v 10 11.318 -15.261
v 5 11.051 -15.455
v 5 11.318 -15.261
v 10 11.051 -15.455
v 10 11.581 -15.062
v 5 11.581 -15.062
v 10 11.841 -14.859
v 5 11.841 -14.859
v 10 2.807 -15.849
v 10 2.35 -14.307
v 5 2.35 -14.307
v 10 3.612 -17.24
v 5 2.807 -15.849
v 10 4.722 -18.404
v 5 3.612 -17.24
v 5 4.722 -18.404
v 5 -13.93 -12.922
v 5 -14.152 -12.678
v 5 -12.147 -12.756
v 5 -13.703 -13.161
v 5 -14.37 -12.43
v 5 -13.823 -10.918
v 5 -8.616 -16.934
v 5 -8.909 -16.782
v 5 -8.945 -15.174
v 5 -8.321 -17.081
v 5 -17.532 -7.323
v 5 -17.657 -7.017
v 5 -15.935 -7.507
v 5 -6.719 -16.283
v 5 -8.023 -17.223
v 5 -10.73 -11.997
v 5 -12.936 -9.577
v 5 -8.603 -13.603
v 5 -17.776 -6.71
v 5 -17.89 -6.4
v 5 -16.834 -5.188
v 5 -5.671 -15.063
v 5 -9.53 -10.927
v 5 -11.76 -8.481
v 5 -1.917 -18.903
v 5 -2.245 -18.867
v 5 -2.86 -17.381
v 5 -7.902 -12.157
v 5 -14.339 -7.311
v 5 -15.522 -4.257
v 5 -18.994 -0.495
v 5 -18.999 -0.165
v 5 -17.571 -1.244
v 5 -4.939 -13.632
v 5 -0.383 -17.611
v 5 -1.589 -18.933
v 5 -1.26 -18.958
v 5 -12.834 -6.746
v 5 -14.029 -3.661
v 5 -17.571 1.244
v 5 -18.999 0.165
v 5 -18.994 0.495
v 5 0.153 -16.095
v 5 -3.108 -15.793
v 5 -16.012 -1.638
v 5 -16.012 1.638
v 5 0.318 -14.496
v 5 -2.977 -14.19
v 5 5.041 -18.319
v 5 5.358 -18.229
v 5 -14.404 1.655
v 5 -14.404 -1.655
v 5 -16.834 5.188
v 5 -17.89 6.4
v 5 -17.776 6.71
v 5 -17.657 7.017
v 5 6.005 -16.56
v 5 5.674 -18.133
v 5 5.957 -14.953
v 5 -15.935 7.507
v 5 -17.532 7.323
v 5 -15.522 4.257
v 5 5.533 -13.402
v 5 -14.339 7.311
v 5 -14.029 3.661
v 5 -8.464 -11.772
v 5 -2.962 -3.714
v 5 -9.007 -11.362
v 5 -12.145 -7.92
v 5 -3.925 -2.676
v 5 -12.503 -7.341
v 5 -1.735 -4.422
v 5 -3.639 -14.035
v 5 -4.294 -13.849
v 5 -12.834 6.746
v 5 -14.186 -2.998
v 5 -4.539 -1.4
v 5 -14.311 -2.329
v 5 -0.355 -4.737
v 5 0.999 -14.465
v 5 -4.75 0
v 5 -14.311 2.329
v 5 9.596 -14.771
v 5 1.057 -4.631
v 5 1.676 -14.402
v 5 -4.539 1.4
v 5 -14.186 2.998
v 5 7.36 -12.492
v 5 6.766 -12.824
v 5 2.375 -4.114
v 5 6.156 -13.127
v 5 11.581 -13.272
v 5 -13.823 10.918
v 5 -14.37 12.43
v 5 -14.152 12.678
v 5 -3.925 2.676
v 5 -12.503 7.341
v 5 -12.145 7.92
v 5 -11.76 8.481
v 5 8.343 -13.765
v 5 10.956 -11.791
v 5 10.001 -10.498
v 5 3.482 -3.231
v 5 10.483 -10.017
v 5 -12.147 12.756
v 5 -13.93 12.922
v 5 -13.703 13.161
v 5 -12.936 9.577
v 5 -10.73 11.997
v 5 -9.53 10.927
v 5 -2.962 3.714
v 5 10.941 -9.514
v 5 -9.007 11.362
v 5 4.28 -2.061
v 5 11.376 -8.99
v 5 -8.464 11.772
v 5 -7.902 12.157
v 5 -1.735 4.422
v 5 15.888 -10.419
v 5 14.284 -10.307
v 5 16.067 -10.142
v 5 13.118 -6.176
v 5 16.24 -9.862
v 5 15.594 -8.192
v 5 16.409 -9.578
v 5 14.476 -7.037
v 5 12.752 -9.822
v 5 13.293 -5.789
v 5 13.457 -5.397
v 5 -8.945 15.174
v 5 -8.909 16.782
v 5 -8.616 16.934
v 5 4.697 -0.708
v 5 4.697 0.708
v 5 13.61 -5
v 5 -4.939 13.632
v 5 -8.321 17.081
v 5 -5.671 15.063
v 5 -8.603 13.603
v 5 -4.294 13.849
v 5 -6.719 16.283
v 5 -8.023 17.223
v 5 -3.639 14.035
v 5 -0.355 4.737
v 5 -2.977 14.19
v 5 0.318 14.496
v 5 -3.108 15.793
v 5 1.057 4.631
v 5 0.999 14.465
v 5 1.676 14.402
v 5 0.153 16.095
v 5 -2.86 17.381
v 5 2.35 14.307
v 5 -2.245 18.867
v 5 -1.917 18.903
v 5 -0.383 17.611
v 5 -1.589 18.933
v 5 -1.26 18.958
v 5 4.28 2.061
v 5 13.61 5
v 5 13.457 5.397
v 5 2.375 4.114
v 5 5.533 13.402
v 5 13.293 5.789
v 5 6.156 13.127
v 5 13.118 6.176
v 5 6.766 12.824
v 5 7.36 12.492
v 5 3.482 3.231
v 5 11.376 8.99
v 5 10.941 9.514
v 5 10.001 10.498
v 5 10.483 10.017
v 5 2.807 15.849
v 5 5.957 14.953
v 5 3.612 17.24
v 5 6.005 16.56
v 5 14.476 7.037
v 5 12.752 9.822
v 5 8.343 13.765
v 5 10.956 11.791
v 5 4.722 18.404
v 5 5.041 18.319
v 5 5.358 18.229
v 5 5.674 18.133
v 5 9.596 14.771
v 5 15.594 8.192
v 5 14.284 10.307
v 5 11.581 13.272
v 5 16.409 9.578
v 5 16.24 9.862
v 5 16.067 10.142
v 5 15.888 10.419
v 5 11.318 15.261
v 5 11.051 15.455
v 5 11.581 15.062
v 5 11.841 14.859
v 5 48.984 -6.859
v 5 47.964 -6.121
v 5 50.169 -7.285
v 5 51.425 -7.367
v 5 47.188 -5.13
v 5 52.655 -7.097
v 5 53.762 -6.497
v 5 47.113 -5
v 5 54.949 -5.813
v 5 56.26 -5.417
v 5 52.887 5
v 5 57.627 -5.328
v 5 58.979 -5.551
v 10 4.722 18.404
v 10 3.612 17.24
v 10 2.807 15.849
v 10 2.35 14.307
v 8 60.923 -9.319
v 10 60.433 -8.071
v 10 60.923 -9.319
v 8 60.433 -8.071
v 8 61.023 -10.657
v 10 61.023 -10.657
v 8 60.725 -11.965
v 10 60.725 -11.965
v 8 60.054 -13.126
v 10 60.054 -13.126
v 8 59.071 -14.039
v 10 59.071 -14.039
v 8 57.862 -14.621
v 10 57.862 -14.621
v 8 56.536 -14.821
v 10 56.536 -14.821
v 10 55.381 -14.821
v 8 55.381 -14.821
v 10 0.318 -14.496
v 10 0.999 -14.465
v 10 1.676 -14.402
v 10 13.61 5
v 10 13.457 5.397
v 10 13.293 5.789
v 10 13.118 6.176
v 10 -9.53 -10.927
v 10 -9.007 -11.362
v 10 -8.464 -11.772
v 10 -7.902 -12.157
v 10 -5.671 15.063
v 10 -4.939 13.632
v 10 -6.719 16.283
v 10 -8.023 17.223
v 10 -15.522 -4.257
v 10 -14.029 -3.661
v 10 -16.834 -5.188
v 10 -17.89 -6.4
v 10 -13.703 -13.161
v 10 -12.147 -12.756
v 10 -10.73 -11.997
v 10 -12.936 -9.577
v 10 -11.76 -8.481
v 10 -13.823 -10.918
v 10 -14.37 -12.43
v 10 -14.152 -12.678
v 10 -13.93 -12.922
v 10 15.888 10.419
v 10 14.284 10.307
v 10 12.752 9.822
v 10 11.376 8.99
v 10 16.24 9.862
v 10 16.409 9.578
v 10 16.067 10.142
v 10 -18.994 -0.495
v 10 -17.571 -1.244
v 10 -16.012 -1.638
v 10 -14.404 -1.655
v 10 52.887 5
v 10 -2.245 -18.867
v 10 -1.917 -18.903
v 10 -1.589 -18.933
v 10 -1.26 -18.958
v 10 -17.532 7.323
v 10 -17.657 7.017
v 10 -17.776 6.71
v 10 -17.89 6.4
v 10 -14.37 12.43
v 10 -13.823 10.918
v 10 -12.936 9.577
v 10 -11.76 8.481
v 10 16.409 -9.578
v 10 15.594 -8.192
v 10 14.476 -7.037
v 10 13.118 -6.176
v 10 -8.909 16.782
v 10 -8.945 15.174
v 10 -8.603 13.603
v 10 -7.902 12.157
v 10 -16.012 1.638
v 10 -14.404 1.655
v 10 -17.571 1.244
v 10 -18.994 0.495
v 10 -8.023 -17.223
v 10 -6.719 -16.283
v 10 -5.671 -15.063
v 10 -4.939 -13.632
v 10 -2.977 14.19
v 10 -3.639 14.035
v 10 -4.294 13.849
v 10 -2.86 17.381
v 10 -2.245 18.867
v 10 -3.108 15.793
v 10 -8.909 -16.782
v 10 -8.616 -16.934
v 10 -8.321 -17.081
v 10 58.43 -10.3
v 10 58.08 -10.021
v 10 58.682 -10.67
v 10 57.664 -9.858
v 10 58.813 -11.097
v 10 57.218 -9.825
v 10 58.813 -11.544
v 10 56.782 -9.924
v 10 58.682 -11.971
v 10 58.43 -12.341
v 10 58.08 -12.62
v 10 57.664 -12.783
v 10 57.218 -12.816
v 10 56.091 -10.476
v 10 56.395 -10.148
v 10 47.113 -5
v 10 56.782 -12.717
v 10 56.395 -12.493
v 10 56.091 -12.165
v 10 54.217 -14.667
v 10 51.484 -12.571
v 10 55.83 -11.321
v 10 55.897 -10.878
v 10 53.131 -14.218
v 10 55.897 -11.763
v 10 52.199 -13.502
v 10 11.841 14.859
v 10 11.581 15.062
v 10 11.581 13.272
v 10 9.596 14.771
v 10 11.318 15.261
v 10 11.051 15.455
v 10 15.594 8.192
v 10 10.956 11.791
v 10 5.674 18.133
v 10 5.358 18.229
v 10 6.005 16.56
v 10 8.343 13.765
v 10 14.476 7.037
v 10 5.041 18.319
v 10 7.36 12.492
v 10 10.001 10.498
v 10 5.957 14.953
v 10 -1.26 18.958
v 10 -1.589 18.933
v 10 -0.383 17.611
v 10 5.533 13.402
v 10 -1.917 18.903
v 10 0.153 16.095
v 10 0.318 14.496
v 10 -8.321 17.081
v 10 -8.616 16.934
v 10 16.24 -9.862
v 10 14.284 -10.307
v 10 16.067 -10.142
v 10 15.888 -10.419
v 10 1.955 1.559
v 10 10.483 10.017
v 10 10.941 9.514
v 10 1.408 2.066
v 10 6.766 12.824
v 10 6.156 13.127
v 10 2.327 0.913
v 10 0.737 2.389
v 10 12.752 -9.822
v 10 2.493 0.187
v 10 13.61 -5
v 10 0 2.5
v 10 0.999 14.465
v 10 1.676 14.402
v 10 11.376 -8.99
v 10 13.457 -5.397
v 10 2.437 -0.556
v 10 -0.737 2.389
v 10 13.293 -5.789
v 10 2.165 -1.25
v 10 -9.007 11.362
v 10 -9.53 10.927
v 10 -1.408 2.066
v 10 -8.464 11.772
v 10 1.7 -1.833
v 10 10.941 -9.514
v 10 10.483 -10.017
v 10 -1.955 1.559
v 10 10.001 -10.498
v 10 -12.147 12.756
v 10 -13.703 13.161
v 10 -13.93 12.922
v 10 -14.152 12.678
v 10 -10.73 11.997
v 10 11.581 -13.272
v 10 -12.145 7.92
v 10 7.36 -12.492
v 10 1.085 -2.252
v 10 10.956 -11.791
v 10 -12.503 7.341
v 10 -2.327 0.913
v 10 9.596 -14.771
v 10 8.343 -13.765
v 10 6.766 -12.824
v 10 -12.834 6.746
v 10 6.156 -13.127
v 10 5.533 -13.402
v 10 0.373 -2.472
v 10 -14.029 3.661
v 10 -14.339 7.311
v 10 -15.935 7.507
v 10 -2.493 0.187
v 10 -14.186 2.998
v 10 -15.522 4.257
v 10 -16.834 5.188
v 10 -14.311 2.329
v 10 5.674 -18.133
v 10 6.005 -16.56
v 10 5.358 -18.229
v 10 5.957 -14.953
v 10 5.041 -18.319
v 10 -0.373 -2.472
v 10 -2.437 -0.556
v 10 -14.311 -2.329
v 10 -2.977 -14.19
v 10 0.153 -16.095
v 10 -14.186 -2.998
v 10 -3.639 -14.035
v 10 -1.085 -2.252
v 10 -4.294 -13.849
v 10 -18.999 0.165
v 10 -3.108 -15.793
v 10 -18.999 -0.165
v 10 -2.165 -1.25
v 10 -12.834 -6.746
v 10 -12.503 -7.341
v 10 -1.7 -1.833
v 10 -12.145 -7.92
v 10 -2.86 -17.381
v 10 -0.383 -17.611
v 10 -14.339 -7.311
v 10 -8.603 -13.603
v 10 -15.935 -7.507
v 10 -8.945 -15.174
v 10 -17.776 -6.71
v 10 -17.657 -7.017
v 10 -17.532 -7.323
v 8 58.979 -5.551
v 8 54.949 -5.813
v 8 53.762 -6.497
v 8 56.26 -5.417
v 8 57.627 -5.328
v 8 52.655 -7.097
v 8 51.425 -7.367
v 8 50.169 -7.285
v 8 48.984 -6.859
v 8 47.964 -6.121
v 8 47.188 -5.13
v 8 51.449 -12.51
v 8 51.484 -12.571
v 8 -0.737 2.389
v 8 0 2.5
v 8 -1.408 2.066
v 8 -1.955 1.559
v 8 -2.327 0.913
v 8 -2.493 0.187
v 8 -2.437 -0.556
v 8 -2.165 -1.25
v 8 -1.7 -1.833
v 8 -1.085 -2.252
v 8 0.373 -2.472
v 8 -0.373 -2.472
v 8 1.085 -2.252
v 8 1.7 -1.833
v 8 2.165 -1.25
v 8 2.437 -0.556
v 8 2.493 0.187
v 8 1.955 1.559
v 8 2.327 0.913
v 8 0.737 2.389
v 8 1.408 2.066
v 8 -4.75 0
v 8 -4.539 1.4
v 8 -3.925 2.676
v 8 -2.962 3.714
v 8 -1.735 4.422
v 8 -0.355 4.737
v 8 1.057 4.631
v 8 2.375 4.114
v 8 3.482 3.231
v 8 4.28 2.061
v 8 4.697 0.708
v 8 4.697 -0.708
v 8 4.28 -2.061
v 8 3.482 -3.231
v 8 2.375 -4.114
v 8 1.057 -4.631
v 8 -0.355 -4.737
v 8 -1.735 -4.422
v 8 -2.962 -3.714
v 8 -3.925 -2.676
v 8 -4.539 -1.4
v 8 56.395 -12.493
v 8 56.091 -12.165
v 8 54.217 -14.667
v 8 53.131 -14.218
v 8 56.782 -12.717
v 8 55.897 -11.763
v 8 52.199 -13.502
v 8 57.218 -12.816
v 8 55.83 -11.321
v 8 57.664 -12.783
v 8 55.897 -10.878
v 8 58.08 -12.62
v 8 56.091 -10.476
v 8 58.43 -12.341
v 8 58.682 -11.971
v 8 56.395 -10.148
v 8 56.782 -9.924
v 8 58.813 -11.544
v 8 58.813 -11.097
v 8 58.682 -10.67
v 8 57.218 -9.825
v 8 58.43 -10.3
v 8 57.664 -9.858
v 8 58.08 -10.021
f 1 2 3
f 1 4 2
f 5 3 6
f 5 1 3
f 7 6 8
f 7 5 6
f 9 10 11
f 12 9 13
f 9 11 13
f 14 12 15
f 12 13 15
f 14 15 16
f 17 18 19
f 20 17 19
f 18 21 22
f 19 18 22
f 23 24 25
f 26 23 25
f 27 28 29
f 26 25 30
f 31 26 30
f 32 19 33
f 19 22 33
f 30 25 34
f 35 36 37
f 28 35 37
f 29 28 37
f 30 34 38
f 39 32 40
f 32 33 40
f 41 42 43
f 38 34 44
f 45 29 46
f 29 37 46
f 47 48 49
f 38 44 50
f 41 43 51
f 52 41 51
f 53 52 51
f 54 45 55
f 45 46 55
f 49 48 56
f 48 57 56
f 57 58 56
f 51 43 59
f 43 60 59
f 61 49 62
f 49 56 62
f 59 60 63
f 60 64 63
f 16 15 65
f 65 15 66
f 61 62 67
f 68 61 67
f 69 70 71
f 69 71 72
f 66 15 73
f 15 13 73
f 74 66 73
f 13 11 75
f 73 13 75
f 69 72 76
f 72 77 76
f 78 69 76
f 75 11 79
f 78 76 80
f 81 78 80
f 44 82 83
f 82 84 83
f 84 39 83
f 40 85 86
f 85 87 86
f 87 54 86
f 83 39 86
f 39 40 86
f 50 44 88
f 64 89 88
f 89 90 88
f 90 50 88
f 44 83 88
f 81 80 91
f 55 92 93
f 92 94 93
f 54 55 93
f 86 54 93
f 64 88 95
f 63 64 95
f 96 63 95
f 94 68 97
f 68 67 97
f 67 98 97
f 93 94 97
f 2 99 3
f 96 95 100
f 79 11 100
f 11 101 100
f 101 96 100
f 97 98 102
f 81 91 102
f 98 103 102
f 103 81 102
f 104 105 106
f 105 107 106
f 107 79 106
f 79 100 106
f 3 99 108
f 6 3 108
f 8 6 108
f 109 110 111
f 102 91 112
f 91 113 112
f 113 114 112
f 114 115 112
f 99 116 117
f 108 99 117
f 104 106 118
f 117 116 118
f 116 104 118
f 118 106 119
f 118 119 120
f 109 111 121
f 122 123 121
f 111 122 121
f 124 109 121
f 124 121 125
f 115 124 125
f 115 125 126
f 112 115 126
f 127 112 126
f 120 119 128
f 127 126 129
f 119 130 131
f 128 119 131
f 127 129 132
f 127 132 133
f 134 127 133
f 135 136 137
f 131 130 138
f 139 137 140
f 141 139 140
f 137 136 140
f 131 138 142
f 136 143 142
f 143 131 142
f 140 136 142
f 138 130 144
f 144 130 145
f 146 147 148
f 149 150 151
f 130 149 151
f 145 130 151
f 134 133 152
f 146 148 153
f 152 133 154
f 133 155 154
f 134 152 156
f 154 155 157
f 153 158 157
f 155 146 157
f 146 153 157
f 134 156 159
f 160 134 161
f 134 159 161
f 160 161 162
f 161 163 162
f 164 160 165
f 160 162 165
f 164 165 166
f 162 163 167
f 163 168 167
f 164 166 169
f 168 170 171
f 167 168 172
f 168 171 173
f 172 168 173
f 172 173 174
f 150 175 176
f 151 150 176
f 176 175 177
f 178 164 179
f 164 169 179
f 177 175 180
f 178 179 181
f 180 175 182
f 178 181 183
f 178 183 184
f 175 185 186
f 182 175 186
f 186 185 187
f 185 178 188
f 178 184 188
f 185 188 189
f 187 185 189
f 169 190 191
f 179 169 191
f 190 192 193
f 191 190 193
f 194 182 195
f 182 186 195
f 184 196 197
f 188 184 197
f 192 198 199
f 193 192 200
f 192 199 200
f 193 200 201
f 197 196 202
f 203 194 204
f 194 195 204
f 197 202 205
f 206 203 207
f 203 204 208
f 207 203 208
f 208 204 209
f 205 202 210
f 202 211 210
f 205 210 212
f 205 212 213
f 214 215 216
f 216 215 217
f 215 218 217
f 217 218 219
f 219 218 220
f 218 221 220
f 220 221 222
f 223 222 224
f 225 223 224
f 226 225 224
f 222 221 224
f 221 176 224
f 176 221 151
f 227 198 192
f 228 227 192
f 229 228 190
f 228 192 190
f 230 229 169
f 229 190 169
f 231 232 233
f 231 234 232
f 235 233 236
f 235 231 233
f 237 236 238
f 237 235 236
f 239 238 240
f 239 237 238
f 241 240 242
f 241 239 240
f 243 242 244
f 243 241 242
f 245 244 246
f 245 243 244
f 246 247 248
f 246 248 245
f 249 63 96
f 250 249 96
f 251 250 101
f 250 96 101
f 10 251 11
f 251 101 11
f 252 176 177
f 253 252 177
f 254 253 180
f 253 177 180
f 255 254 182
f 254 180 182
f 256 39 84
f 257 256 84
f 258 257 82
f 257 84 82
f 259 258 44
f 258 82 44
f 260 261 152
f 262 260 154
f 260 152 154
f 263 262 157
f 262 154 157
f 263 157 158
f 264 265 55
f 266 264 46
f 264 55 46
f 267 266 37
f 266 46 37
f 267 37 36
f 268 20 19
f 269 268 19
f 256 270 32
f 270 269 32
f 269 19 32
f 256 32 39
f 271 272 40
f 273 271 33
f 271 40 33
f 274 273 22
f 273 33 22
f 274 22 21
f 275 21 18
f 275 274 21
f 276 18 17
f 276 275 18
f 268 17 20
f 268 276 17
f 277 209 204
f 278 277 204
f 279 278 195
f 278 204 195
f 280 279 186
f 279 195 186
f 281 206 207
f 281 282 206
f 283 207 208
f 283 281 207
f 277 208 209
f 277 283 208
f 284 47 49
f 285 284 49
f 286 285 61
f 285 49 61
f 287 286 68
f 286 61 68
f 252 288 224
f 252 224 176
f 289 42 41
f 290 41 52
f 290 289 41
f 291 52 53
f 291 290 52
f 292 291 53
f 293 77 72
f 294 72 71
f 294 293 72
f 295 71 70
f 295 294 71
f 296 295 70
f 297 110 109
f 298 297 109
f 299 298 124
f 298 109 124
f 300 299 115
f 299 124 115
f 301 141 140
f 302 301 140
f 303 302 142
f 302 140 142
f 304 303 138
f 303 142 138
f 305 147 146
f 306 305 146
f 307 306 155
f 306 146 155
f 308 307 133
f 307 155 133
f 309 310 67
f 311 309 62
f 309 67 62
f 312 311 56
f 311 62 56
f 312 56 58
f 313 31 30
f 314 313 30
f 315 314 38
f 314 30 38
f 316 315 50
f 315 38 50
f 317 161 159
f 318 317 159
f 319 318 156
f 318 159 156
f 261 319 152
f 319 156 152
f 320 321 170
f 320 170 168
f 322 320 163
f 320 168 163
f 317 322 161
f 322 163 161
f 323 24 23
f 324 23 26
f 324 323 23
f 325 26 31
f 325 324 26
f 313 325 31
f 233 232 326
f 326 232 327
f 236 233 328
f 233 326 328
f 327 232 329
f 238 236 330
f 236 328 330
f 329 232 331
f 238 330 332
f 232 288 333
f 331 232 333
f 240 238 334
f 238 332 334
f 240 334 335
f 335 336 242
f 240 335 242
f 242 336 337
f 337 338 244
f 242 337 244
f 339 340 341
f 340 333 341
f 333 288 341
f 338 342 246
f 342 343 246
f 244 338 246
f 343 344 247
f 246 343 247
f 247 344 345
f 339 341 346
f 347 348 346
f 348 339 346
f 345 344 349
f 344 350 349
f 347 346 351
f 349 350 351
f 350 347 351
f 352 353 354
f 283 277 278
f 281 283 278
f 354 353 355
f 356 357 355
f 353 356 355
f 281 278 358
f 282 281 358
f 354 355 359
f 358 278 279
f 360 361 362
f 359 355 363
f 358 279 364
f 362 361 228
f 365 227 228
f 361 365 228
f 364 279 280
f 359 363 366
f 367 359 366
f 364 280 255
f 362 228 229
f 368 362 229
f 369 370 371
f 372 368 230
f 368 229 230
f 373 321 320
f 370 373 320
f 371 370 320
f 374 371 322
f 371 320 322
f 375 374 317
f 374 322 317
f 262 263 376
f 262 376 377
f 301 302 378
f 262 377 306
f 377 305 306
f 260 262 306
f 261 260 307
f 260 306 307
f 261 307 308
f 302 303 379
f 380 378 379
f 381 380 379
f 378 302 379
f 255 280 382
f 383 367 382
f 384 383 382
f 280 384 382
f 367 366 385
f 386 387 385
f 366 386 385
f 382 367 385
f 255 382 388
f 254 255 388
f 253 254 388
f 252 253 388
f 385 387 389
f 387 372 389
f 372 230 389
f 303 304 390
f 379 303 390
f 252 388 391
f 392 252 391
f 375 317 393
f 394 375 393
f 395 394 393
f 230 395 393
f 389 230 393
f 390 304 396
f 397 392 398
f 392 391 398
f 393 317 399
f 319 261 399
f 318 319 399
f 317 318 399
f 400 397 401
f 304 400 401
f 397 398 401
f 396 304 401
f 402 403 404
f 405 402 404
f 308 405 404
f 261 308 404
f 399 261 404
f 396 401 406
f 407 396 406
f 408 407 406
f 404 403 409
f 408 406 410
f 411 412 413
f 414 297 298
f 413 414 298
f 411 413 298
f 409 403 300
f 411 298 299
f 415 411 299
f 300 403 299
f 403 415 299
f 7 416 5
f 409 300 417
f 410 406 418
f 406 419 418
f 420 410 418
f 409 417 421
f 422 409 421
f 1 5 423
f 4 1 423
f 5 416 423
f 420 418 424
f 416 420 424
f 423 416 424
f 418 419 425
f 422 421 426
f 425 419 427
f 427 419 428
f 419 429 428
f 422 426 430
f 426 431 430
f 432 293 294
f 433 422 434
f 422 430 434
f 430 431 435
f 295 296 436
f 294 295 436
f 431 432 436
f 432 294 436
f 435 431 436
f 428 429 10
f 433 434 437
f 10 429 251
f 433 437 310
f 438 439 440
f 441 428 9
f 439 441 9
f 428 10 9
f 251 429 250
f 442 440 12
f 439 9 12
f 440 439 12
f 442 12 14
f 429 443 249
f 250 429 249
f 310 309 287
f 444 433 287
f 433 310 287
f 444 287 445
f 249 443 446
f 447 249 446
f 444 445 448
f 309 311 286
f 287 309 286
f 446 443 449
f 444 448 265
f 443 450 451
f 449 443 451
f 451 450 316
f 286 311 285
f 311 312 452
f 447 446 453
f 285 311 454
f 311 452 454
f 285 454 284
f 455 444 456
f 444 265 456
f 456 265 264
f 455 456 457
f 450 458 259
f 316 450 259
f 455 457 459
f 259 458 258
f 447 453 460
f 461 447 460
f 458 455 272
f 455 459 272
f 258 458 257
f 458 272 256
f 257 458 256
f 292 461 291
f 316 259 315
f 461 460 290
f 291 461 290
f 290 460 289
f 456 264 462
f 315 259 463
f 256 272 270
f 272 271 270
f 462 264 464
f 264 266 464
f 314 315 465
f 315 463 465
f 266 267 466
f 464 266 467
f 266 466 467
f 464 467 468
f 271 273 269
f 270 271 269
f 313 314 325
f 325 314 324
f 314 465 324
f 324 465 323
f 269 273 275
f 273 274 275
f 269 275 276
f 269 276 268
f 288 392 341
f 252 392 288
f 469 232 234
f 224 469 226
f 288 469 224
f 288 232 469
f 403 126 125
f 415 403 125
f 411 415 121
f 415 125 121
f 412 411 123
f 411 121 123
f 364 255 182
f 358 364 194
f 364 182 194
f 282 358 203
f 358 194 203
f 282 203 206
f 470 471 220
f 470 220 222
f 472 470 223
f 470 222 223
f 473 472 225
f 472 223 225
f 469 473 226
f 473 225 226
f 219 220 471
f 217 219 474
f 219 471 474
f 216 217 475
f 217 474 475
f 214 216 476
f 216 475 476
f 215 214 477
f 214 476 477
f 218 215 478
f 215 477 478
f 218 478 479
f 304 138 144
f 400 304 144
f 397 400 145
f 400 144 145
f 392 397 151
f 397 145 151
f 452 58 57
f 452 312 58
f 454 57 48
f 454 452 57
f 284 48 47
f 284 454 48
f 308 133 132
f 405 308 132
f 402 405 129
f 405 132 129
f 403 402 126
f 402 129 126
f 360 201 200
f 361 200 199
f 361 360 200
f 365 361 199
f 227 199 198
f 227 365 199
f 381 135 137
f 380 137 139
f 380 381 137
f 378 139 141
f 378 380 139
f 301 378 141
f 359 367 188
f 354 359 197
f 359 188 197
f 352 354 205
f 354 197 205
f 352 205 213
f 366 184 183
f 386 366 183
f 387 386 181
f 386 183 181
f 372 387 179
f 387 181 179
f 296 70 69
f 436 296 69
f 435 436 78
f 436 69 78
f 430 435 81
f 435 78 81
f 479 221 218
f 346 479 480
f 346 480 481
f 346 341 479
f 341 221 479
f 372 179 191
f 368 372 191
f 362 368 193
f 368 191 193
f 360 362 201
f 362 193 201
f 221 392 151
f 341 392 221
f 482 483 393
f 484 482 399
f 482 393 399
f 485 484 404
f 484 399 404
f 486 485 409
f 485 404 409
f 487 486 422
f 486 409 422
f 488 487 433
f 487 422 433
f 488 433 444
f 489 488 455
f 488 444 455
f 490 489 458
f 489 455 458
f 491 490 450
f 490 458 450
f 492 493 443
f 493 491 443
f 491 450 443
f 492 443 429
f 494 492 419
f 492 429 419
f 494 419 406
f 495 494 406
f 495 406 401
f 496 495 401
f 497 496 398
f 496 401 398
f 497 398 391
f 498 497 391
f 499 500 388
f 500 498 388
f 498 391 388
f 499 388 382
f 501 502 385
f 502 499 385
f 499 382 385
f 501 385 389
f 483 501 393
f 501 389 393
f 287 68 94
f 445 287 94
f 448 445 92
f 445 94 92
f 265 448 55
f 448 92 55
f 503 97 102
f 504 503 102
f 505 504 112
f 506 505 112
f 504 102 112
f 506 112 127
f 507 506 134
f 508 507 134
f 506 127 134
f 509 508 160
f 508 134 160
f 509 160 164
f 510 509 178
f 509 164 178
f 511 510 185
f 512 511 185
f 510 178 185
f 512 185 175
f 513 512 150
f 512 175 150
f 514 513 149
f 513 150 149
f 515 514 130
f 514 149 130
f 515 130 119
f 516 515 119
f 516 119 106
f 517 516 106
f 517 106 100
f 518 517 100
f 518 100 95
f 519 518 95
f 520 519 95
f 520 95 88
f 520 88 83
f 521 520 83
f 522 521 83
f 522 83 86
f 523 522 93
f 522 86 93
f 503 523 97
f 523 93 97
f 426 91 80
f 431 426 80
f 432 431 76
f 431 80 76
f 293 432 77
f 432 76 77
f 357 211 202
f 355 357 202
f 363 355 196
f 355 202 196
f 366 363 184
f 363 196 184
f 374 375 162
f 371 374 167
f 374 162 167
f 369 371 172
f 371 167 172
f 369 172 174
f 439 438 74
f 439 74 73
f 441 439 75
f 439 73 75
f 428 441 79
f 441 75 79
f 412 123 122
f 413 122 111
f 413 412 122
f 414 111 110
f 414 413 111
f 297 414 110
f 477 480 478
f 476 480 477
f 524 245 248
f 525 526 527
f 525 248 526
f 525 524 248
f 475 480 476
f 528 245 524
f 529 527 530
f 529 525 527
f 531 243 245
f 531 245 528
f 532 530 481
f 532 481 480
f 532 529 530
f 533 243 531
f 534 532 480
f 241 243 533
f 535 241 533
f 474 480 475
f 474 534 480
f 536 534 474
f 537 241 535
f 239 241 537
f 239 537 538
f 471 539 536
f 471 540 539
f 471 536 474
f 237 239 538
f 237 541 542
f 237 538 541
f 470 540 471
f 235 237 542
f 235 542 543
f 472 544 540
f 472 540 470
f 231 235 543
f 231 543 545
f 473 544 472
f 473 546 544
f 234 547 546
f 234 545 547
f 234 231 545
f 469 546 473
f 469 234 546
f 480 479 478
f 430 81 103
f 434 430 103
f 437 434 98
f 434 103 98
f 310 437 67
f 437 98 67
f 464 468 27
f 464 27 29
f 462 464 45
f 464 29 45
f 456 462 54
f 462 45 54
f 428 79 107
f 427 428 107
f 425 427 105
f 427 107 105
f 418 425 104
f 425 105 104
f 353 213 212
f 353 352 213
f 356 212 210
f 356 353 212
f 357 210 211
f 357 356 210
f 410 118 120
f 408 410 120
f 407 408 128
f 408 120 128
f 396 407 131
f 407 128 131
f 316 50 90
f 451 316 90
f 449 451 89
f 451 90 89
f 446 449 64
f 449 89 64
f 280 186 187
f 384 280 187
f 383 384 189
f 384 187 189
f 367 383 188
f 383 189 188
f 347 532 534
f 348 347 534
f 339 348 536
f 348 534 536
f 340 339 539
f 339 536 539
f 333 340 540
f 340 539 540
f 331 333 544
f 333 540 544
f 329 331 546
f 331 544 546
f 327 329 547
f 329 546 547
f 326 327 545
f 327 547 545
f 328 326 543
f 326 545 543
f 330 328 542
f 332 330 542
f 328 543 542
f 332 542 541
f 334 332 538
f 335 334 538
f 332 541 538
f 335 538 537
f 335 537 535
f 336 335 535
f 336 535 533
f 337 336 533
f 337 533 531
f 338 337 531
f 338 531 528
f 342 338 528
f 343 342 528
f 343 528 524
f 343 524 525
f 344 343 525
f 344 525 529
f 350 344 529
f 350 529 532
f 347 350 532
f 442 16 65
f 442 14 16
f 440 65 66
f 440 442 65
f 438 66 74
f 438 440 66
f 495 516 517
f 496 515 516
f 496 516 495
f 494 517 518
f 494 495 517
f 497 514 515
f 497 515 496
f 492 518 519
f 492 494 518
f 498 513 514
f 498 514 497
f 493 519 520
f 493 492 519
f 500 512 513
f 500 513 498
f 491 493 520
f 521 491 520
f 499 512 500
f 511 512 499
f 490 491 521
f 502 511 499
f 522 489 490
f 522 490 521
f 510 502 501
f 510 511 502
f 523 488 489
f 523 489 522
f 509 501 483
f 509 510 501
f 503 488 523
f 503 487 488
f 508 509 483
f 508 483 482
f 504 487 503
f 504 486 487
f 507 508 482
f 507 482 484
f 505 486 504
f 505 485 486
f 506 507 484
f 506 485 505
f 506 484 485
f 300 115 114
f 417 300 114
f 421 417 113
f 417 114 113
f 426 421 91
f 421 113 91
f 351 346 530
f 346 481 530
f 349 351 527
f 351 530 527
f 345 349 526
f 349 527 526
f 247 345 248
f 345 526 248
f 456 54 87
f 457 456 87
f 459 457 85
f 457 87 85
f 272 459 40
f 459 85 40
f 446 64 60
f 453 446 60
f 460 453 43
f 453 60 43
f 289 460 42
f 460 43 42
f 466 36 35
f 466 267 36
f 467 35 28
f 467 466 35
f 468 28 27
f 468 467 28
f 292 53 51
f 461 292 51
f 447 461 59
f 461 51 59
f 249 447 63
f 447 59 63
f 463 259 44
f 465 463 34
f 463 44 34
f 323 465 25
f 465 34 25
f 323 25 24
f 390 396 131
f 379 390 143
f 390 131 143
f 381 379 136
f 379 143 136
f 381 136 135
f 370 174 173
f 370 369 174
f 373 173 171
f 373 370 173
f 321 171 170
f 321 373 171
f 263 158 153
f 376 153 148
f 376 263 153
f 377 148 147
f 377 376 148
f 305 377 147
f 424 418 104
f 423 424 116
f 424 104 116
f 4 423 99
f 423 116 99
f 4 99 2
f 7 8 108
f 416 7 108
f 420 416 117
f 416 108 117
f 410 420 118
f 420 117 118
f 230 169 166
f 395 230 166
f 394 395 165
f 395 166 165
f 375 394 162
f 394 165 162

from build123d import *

# Parameters (mm, degrees)
BASPROSKE_W             = 10
BASPROSKE_H             = 19
TOOTHCUT_DEPTH          = 29.670542374
TEETHCUTS_COUNT         = 17
TEETHCUTS_ANGLE         = 338.823529412
BORSKE_R                = 2.5
BORE_DEPTH              = 50.0018796
CUT_EXTRUDE1_DEPTH      = 20
CUT_EXTRUDE1_DEPTH_BACK = 20
SKETCH1_W               = 10
SKETCH1_H               = 40
BOSS_EXTRUDE1_DEPTH     = 5
CUT_EXTRUDE2_START      = -3
SKETCH5_R               = 4.75
SKETCH5_R_2             = 2.5
CUT_EXTRUDE2_DEPTH      = 3
SKETCH6_R               = 1.5
CUT_EXTRUDE3_DEPTH      = 68.251600881
CUT_EXTRUDE4_DEPTH      = 3
FILLET1_R               = 4.5
FILLET2_R               = 4.5


with BuildPart() as part:
    # BasProSke → Base-Revolve (revolve)
    with BuildSketch(Plane(origin=(0, 0, 0), x_dir=(1, 0, 0), z_dir=(0, 1, 0))):
        with Locations((5, 9.5)):
            Rectangle(BASPROSKE_W, BASPROSKE_H)
    revolve(axis=Axis((-10, 0, 0), (1, 0, 0)))

    # TooCutSke → ToothCut (cut, through all)
    with BuildSketch(Plane(origin=(0, 0, 0), x_dir=(0, 0, -1), z_dir=(1, 0, 0))):
        with BuildLine():
            ThreePointArc((1.020352389, 14.463052306), (0, 14.499), (-1.020352389, 14.463052306))
            ThreePointArc((-1.020352389, 14.463052306), (-1.632621885, 16.804485203), (-3.026143023, 18.783192049))
            ThreePointArc((-3.026143023, 18.783192049), (0, 19.0254), (3.026143023, 18.783192049))
            ThreePointArc((3.026143023, 18.783192049), (1.632621885, 16.804485203), (1.020352389, 14.463052306))
        make_face()
    toothcut = extrude(amount=TOOTHCUT_DEPTH, mode=Mode.SUBTRACT)

    # TeethCuts: ToothCut ×17 about axis
    teethcuts_axis = Axis((-10, 0, 0), (1, 0, 0))
    for i in range(1, TEETHCUTS_COUNT):
        add(toothcut.rotate(teethcuts_axis, i * TEETHCUTS_ANGLE / (TEETHCUTS_COUNT - 1)), mode=Mode.SUBTRACT)

    # BorSke → Bore (cut, symmetric)
    with BuildSketch(Plane(origin=(0, 0, 0), x_dir=(0, 0, -1), z_dir=(1, 0, 0))):
        Circle(BORSKE_R)
    extrude(amount=BORE_DEPTH, both=True, mode=Mode.SUBTRACT)

    # Sketch1 → Cut-Extrude1 (cut, two sides: drawn at the far end of the back side and taken through both)
    with BuildSketch(Plane.XY.offset(-CUT_EXTRUDE1_DEPTH_BACK)):
        Rectangle(SKETCH1_W, SKETCH1_H)
    extrude(amount=CUT_EXTRUDE1_DEPTH + CUT_EXTRUDE1_DEPTH_BACK, mode=Mode.SUBTRACT)

    # Sketch4 → Boss-Extrude1 (add)
    with BuildSketch(Plane(origin=(10, 0, 0), x_dir=(0, 0, -1), z_dir=(1, 0, 0))):
        with BuildLine():
            Line((5, 0), (5, 47.113248654))
            Line((5, 47.113248654), (14.820508076, 52.783121635))
            Line((14.820508076, 52.783121635), (14.820508076, 64.330127019))
            Line((14.820508076, 64.330127019), (-5, 52.886751346))
            Line((-5, 52.886751346), (-5, 0))
            Line((-5, 0), (-2.5, 0))
            ThreePointArc((-2.5, 0), (0, 2.5), (2.5, 0))
            Line((2.5, 0), (5, 0))
        make_face()
    extrude(amount=-BOSS_EXTRUDE1_DEPTH)

    # Sketch5 → Cut-Extrude2 (cut)
    with BuildSketch(Plane.ZY.offset(-5).offset(CUT_EXTRUDE2_START)):
        Circle(SKETCH5_R)
        Circle(SKETCH5_R_2, mode=Mode.SUBTRACT)
    extrude(amount=CUT_EXTRUDE2_DEPTH, mode=Mode.SUBTRACT)

    # Sketch6 → Cut-Extrude3 (cut, through all)
    with BuildSketch(Plane.ZY.offset(-5)):
        with Locations((-11.320508076, 57.330127019)):
            Circle(SKETCH6_R)
    extrude(amount=-CUT_EXTRUDE3_DEPTH, mode=Mode.SUBTRACT)

    # Sketch7 → Cut-Extrude4 (cut)
    with BuildSketch(Plane.ZY.offset(-5)):
        with BuildLine():
            Line((-21.855234833, 56.484151118), (-14.320508076, 52.133974596))
            ThreePointArc((-14.320508076, 52.133974596), (-6.124355653, 54.330127019), (-8.320508076, 62.526279442))
            Line((-8.320508076, 62.526279442), (-15.855234833, 66.876455963))
            Line((-15.855234833, 66.876455963), (-21.855234833, 56.484151118))
        make_face()
    extrude(amount=-CUT_EXTRUDE4_DEPTH, mode=Mode.SUBTRACT)

    # Fillet1
    fillet1_edges = [part.edges().sort_by_distance(p)[0] for p in [
        (9, 52.783121635, -14.820508076),
        (9, 64.330127019, -14.820508076),
    ]]
    fillet(fillet1_edges, radius=FILLET1_R)

    # Fillet2
    fillet2_edges = [part.edges().sort_by_distance(p)[0] for p in [
        (6.5, 51.449252752, -12.5101794),
    ]]
    fillet(fillet2_edges, radius=FILLET2_R)


solid = part.part
